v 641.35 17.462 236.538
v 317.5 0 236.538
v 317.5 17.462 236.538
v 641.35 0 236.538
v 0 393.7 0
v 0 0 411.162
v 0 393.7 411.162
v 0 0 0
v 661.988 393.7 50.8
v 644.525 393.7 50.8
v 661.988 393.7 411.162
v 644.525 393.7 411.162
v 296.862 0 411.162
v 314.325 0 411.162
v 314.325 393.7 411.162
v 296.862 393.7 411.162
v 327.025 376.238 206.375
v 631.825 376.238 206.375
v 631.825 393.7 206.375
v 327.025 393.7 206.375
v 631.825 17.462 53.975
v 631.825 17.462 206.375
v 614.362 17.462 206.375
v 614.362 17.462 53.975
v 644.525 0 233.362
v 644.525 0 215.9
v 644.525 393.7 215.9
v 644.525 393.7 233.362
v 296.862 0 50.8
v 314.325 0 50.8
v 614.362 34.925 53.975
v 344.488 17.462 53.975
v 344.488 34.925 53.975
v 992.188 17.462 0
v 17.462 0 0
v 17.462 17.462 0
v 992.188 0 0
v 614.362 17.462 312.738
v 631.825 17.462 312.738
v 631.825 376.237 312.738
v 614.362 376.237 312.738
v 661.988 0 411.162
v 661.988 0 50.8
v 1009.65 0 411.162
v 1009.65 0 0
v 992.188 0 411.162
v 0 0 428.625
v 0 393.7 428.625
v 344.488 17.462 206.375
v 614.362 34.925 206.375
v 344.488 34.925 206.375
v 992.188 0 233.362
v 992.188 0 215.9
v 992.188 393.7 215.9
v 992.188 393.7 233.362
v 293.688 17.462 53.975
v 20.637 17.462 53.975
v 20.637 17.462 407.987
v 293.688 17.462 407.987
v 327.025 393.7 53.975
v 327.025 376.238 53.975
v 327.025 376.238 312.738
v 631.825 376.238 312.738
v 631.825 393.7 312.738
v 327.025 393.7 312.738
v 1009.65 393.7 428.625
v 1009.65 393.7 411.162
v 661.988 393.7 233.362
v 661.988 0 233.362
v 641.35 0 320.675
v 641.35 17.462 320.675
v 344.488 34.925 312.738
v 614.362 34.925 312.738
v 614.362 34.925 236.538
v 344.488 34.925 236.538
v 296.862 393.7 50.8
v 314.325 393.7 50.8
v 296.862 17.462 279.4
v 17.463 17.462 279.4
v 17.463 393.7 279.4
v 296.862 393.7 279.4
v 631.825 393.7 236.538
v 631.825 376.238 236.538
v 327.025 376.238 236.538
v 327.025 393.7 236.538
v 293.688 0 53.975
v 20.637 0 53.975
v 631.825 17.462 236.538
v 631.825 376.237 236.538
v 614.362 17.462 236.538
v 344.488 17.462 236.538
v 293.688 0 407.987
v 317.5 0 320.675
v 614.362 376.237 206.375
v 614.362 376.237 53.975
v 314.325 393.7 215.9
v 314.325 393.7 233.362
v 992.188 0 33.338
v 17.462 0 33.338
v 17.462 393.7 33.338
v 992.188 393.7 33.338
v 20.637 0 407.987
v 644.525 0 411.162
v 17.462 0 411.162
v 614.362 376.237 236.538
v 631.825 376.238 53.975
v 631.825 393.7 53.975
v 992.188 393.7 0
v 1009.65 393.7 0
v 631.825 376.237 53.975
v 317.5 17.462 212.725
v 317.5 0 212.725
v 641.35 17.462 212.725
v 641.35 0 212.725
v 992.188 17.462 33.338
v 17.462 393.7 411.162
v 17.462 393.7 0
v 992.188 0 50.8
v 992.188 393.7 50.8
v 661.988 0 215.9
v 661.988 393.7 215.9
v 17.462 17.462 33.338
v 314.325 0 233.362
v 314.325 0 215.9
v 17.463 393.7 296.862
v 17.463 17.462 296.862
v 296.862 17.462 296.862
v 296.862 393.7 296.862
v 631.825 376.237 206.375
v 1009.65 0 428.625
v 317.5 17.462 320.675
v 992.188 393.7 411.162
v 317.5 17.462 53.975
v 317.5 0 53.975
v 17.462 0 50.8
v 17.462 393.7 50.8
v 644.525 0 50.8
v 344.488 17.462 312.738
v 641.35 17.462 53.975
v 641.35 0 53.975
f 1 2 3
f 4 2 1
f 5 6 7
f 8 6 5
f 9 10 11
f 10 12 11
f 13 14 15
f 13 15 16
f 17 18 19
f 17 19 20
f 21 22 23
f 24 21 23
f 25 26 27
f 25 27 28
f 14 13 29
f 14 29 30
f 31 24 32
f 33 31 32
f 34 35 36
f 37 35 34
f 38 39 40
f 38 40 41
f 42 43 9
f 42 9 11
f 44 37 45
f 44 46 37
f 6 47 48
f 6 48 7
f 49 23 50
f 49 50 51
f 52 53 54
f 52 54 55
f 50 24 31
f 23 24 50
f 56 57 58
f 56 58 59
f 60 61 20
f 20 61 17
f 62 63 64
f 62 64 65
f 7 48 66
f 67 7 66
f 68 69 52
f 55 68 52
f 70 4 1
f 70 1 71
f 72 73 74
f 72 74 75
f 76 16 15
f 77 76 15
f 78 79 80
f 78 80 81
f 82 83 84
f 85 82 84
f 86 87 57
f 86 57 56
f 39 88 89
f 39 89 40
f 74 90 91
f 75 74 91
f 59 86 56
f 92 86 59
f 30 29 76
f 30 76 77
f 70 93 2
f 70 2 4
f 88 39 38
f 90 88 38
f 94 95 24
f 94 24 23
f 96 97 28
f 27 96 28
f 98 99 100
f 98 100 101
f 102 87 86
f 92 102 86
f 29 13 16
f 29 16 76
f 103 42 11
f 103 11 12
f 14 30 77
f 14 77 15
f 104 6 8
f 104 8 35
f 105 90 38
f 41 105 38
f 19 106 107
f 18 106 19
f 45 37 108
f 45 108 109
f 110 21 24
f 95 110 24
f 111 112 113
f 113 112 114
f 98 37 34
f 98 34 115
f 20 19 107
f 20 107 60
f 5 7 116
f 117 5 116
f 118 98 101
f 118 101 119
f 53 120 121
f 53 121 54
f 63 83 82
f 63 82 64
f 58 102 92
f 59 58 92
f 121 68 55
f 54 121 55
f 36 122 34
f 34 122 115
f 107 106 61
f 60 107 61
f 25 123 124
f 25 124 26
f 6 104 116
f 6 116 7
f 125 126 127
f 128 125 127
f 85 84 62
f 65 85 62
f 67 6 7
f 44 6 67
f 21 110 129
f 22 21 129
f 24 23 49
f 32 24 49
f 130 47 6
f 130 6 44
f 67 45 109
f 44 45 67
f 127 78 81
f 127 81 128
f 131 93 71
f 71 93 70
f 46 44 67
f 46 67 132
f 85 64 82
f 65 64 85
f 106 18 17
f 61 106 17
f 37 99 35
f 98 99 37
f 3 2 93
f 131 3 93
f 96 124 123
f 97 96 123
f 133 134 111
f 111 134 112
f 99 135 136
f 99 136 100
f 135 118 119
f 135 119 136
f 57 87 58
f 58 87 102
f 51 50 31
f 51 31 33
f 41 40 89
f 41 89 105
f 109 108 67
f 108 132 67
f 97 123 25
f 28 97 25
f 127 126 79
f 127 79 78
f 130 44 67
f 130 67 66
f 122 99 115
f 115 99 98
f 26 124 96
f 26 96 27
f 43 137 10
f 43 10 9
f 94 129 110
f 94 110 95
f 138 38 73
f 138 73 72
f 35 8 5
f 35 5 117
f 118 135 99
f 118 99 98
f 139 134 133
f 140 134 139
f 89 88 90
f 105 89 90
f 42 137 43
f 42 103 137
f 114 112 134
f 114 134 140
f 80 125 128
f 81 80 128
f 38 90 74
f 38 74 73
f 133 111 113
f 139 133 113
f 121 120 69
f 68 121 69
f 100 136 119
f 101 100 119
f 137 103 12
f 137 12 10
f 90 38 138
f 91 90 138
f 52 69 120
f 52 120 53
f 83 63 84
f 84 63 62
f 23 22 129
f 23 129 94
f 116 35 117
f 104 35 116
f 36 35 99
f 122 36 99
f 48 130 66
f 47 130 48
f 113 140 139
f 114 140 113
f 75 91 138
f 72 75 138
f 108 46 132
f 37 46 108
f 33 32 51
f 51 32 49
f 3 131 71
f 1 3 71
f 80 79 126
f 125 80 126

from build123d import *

# Parameters (mm, degrees)
F3_DEPTH  = 393.7
F4_DEPTH  = 393.7
F5_DEPTH  = 393.7
F6_DEPTH  = 393.7
F7_DEPTH  = 393.7
F8_START  = -17.4625
F2_W      = 279.4
F2_H      = 17.4625
F8_DEPTH  = 376.2375
F9_DEPTH  = 393.7
F2_W_2    = 974.725
F2_H_2    = 33.3375
F10_DEPTH = 17.4625
F2_W_3    = 330.2
F11_DEPTH = 393.7
F12_DEPTH = 393.7
F13_W     = 323.85
F13_H     = 158.75
F14_DEPTH = 17.4625
F15_W     = 17.4625
F15_H     = 152.4
F16_DEPTH = 358.775
F17_W     = 304.8
F17_H     = 152.4
F18_DEPTH = 17.4625
F19_W     = 273.05
F19_H     = 354.0125
F20_DEPTH = 17.4625
F21_W     = 323.85
F21_H     = 84.1375
F22_DEPTH = 17.4625
F23_W     = 269.875
F23_H     = 152.4
F24_DEPTH = 17.4625
F25_W     = 17.4625
F25_H     = 76.2
F26_DEPTH = 358.775
F27_W     = 269.875
F27_H     = 76.2
F28_DEPTH = 17.4625
F29_W     = 304.8
F29_H     = 76.2
F30_DEPTH = 17.4625


# Not quite as in the source:
# - a variable given as a bare number and used for a length is read in inches; the dataset says mm whatever the document's units were


with BuildPart() as f3:
    # F2 (on Front) → F3 (new body)
    with BuildSketch(Plane.XZ):
        Polygon((0, 428.625), (0, 411.1625), (17.4625, 411.1625), (296.8625, 411.1625), (314.325, 411.1625), (644.525, 411.1625), (661.9875, 411.1625), (992.1875, 411.1625), (1009.65, 411.1625), (1009.65, 428.625), align=None)
    extrude(amount=-F3_DEPTH)


with BuildPart() as f4:
    # F2 (on Front) → F4 (new body)
    with BuildSketch(Plane.XZ):
        Polygon((0, 411.1625), (0, 0), (17.4625, 0), (17.4625, 33.3375), (17.4625, 50.8), (17.4625, 279.4), (17.4625, 296.8625), (17.4625, 411.1625), align=None)
    extrude(amount=-F4_DEPTH)


with BuildPart() as f5:
    # F2 (on Front) → F5 (new body)
    with BuildSketch(Plane.XZ):
        Polygon((314.325, 411.1625), (296.8625, 411.1625), (296.8625, 296.8625), (296.8625, 279.4), (296.8625, 50.8), (314.325, 50.8), (314.325, 215.9), (314.325, 233.3625), (314.325, 322.2625), align=None)
    extrude(amount=-F5_DEPTH)


with BuildPart() as f6:
    # F2 (on Front) → F6 (new body)
    with BuildSketch(Plane.XZ):
        Polygon((644.525, 50.8), (661.9875, 50.8), (661.9875, 215.9), (661.9875, 233.3625), (661.9875, 322.2625), (661.9875, 411.1625), (644.525, 411.1625), (644.525, 322.2625), (644.525, 233.3625), (644.525, 215.9), align=None)
    extrude(amount=-F6_DEPTH)


with BuildPart() as f7:
    # F2 (on Front) → F7 (new body)
    with BuildSketch(Plane.XZ):
        Polygon((992.1875, 33.3375), (992.1875, 0), (1009.65, 0), (1009.65, 411.1625), (992.1875, 411.1625), (992.1875, 322.2625), (992.1875, 233.3625), (992.1875, 215.9), (992.1875, 50.8), align=None)
    extrude(amount=-F7_DEPTH)


with BuildPart() as f8:
    # F2 (on Front) → F8 (new body)
    with BuildSketch(Plane.XZ.offset(F8_START)):
        with Locations((157.1625, 288.13125)):
            Rectangle(F2_W, F2_H)
    extrude(amount=-F8_DEPTH)


with BuildPart() as f9:
    # F2 (on Front) → F9 (new body)
    with BuildSketch(Plane.XZ):
        Polygon((17.4625, 50.8), (17.4625, 33.3375), (992.1875, 33.3375), (992.1875, 50.8), (661.9875, 50.8), (644.525, 50.8), (314.325, 50.8), (296.8625, 50.8), align=None)
    extrude(amount=-F9_DEPTH)


with BuildPart() as f10:
    # F2 (on Front) → F10 (new body)
    with BuildSketch(Plane.XZ):
        with Locations((504.825, 16.66875)):
            Rectangle(F2_W_2, F2_H_2)
    extrude(amount=-F10_DEPTH)


with BuildPart() as f11:
    # F2 (on Front) → F11 (new body)
    with BuildSketch(Plane.XZ):
        with Locations((479.425, 224.63125)):
            Rectangle(F2_W_3, F2_H)
    extrude(amount=-F11_DEPTH)


with BuildPart() as f12:
    # F2 (on Front) → F12 (new body)
    with BuildSketch(Plane.XZ):
        with Locations((827.0875, 224.63125)):
            Rectangle(F2_W_3, F2_H)
    extrude(amount=-F12_DEPTH)


with BuildPart() as f14:
    # F13 (on Front) → F14 (new body)
    with BuildSketch(Plane.XZ):
        with Locations((479.425, 133.35)):
            Rectangle(F13_W, F13_H)
    extrude(amount=-F14_DEPTH)


with BuildPart() as f16:
    # F15 (on face) → F16 (new body)
    with BuildSketch(Plane(origin=(0, 17.4625, 0), x_dir=(-1, 0, 0), z_dir=(0, 1, 0))):
        with Locations((-623.09375, 130.175)):
            Rectangle(F15_W, F15_H)
    extrude(amount=F16_DEPTH)


with BuildPart() as f18:
    # F17 (on face) → F18 (new body)
    with BuildSketch(Plane(origin=(0, 376.2375, 0), x_dir=(-1, 0, 0), z_dir=(0, 1, 0))):
        with Locations((-479.425, 130.175)):
            Rectangle(F17_W, F17_H)
    extrude(amount=F18_DEPTH)


with BuildPart() as f20:
    # F19 (on Front) → F20 (new body)
    with BuildSketch(Plane.XZ):
        with Locations((157.1625, 230.98125)):
            Rectangle(F19_W, F19_H)
    extrude(amount=-F20_DEPTH)


with BuildPart() as f22:
    # F21 (on Front) → F22 (new body)
    with BuildSketch(Plane.XZ):
        with Locations((479.425, 278.60625)):
            Rectangle(F21_W, F21_H)
    extrude(amount=-F22_DEPTH)


with BuildPart() as f24:
    # F23 (on face) → F24 (new body)
    with BuildSketch(Plane(origin=(0, 17.4625, 0), x_dir=(-1, 0, 0), z_dir=(0, 1, 0))):
        with Locations((-479.425, 130.175)):
            Rectangle(F23_W, F23_H)
    extrude(amount=F24_DEPTH)


with BuildPart() as f26:
    # F25 (on face) → F26 (new body)
    with BuildSketch(Plane(origin=(0, 17.4625, 0), x_dir=(-1, 0, 0), z_dir=(0, 1, 0))):
        with Locations((-623.09375, 274.6375)):
            Rectangle(F25_W, F25_H)
    extrude(amount=F26_DEPTH)


with BuildPart() as f28:
    # F27 (on face) → F28 (new body)
    with BuildSketch(Plane(origin=(0, 17.4625, 0), x_dir=(-1, 0, 0), z_dir=(0, 1, 0))):
        with Locations((-479.425, 274.6375)):
            Rectangle(F27_W, F27_H)
    extrude(amount=F28_DEPTH)


with BuildPart() as f30:
    # F29 (on face) → F30 (new body)
    with BuildSketch(Plane(origin=(0, 376.2375, 0), x_dir=(-1, 0, 0), z_dir=(0, 1, 0))):
        with Locations((-479.425, 274.6375)):
            Rectangle(F29_W, F29_H)
    extrude(amount=F30_DEPTH)


solid = Compound([f3.part, f4.part, f5.part, f6.part, f7.part, f8.part, f9.part, f10.part, f11.part, f12.part, f14.part, f16.part, f18.part, f20.part, f22.part, f24.part, f26.part, f28.part, f30.part])
